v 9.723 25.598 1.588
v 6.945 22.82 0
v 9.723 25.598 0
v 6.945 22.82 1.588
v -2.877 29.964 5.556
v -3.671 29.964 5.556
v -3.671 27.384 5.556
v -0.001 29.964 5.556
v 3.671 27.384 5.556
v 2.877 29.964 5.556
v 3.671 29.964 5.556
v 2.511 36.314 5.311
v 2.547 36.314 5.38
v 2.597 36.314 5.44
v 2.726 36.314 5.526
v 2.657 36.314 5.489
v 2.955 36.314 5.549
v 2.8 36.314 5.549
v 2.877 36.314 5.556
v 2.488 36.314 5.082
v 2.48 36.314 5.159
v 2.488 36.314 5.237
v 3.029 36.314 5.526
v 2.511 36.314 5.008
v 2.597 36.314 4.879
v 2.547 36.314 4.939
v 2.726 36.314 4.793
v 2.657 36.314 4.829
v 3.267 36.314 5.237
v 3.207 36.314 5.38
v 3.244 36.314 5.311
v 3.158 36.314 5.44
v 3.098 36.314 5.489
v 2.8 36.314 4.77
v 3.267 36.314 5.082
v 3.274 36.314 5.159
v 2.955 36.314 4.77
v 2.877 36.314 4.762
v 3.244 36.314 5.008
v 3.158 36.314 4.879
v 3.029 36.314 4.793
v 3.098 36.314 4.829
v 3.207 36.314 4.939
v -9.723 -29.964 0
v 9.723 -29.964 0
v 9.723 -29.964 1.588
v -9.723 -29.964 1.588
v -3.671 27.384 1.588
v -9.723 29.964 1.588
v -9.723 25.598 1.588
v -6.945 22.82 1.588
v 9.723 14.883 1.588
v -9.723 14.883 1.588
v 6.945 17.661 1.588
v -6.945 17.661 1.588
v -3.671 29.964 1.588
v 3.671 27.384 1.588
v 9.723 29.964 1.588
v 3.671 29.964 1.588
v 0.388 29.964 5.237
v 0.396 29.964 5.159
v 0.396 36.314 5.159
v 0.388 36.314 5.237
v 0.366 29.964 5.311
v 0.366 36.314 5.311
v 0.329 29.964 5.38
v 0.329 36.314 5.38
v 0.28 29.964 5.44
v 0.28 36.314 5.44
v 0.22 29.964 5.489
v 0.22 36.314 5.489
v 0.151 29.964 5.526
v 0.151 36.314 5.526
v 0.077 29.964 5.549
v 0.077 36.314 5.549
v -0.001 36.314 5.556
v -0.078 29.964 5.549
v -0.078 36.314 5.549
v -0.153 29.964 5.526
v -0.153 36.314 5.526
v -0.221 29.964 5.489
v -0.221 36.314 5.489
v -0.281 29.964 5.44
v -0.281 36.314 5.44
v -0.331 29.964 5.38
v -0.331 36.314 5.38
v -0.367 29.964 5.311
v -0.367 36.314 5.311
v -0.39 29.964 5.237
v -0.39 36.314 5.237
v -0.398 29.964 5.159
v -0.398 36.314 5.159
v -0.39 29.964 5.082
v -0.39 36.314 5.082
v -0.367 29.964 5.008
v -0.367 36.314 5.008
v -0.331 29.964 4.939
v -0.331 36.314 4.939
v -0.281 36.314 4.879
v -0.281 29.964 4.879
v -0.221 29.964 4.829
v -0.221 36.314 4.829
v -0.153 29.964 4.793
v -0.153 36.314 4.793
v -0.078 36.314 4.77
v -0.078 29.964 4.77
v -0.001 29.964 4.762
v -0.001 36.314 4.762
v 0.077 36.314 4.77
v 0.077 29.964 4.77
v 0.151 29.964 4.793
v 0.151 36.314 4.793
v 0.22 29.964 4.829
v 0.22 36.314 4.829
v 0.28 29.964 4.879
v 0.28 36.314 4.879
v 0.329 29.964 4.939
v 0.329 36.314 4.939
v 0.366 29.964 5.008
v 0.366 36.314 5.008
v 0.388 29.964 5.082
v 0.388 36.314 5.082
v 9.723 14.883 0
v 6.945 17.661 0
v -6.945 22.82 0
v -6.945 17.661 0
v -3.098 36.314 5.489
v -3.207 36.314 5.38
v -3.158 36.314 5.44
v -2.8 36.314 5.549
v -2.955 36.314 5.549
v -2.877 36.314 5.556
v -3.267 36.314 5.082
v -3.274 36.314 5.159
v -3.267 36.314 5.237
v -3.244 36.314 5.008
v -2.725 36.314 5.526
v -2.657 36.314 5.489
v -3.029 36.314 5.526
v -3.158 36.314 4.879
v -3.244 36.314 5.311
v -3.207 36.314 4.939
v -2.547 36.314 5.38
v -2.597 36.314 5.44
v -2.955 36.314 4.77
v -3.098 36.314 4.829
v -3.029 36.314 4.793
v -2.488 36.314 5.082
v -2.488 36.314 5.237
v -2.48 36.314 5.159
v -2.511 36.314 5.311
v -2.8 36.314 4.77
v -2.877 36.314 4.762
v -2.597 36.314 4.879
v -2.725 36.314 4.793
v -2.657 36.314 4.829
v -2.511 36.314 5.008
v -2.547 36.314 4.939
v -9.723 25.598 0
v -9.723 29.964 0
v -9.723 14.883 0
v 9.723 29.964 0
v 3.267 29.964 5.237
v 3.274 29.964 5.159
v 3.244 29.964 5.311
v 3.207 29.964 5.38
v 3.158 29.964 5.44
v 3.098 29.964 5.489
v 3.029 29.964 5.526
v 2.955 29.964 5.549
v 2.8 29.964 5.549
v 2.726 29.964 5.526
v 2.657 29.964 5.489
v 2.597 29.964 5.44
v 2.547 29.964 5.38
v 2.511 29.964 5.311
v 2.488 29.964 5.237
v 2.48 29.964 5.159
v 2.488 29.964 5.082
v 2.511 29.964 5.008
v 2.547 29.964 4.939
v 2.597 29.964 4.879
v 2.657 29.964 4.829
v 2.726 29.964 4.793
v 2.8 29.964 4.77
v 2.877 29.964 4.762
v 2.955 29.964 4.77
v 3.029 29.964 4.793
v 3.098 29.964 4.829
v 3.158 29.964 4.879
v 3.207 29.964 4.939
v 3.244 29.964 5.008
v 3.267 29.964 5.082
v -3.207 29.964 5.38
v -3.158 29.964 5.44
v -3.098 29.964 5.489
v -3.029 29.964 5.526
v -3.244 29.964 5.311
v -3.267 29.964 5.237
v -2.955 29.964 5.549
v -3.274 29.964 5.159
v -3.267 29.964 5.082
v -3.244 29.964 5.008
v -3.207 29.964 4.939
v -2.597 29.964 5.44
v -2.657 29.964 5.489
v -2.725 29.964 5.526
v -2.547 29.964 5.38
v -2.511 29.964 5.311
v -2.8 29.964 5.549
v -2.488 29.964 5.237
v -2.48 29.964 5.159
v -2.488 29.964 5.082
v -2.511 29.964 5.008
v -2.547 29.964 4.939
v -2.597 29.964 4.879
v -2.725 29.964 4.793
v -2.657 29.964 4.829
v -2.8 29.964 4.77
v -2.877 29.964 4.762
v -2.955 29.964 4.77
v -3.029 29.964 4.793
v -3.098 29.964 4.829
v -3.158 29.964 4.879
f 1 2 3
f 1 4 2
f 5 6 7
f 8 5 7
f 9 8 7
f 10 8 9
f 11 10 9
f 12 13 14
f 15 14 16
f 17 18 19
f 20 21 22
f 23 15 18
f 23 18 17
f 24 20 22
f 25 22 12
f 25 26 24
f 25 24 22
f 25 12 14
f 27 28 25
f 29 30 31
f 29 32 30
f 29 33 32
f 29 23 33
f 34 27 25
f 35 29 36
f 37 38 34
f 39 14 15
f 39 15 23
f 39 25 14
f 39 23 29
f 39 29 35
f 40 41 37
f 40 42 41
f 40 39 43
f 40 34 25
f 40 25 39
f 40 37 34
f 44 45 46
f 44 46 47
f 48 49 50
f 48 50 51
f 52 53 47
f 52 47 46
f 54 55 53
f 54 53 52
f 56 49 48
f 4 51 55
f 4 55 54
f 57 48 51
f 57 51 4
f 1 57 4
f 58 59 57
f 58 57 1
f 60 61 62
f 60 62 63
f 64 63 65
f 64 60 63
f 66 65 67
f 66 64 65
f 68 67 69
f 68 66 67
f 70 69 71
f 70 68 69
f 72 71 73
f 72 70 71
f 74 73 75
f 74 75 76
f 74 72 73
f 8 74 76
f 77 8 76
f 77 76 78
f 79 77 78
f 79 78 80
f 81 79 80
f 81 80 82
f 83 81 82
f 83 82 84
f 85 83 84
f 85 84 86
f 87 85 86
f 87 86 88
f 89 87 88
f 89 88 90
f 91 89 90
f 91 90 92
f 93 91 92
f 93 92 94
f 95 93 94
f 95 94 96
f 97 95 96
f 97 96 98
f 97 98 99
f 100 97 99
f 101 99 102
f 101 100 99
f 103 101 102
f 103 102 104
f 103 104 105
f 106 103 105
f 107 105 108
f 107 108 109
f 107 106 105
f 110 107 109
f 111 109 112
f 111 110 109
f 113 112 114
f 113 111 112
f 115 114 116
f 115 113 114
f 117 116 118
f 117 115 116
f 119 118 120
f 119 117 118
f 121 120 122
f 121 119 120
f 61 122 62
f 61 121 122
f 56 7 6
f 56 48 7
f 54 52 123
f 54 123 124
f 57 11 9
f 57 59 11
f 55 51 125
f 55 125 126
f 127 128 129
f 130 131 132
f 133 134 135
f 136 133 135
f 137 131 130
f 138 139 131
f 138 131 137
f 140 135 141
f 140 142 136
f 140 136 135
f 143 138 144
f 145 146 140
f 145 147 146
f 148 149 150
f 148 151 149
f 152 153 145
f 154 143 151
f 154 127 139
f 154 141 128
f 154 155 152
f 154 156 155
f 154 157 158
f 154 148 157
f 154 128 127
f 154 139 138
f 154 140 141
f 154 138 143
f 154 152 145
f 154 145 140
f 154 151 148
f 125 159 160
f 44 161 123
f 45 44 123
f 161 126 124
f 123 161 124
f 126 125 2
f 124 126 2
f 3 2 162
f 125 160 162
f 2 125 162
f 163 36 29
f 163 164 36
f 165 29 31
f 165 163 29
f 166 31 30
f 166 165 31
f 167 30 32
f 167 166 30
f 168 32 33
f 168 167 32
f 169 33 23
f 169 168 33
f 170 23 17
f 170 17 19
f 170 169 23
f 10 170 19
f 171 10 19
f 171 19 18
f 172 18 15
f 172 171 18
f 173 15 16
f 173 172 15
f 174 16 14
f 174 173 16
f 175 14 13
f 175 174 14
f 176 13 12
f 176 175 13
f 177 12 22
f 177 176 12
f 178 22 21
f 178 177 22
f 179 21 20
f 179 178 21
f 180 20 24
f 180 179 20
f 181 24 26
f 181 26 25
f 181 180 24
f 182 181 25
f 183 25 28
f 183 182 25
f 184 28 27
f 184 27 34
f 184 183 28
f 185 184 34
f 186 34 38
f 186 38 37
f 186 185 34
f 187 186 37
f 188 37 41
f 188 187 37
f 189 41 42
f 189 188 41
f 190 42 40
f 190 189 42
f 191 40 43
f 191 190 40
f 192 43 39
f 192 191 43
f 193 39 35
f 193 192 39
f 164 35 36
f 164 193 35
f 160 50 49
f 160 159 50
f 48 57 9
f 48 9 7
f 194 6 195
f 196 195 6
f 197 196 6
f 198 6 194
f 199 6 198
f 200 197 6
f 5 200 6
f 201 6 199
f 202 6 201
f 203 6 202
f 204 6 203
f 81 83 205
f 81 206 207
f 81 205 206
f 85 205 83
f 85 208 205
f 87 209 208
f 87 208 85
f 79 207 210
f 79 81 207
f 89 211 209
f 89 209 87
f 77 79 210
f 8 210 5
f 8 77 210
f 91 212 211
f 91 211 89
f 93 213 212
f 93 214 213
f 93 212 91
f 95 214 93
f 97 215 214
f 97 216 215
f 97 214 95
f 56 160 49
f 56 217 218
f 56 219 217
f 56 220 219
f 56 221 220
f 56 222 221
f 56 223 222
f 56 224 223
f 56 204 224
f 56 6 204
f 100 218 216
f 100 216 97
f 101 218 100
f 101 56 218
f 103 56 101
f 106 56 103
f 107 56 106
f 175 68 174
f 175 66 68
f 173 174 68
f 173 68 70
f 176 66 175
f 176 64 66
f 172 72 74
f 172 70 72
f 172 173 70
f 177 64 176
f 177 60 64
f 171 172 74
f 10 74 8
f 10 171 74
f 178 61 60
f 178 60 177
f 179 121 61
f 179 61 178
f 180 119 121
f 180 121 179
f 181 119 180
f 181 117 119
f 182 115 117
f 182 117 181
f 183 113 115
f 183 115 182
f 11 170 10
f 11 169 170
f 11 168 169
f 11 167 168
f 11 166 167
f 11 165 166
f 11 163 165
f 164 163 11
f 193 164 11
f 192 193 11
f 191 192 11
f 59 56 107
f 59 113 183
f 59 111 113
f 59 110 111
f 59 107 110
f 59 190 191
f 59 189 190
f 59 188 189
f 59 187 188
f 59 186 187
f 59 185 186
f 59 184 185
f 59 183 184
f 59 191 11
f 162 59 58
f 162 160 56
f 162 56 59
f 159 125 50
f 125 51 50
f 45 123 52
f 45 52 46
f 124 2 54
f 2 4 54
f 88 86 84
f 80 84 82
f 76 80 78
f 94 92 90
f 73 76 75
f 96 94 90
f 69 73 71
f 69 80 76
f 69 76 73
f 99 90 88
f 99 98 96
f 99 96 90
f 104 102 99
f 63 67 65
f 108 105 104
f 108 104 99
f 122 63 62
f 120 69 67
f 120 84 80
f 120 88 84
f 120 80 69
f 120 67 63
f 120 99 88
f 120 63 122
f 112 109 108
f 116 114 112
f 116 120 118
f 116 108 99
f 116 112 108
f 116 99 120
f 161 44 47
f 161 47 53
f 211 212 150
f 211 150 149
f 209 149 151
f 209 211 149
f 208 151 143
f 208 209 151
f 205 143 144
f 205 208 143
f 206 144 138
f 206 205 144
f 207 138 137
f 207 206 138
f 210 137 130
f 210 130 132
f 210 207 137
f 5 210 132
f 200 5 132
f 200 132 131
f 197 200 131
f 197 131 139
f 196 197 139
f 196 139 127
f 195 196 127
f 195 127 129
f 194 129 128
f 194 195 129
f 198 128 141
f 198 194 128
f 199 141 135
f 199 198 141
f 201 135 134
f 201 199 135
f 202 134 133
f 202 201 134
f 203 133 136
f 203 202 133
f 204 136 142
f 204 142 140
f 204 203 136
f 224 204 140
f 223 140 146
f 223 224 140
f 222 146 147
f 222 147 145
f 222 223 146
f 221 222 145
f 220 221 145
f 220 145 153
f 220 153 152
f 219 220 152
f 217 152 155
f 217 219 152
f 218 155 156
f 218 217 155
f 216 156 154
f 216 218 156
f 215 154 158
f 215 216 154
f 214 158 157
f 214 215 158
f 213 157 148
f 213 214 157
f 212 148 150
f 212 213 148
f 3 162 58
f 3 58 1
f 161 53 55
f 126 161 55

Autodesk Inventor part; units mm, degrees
ref_plane "YZ Plane" through (0, 0, 0) normal (1, 0, 0) x (0, 1, 0)
ref_plane "XZ Plane" through (0, 0, 0) normal (0, 1, 0) x (-1, 0, 0)
ref_plane "XY Plane" through (0, 0, 0) normal (0, 0, 1) x (1, 0, 0)
sketch "Sketch1" plane through (0, 0, 0) normal (0, 0, 1) x (1, 0, 0)
  line L0 (-9.7234, 29.9641) -> (9.7234, 29.9641)
  line L1 (9.7234, 29.9641) -> (9.7234, -29.9641)
  line L2 (9.7234, -29.9641) -> (-9.7234, -29.9641)
  line L3 (-9.7234, -29.9641) -> (-9.7234, 29.9641)
  point P0 (0, 0)
  point P1 (9.7234, 0)
  point P2 (0, -29.9641)
  dimension "d0" = 19.4469
  dimension "d1" = 59.9281
extrude "Extrusion1" add sketch "Sketch1" along normal blind 1.5875
sketch "Sketch2" plane through (0, 0, 1.5875) normal (0, 0, 1) x (1, 0, 0)
  line L0 (-9.7234, -29.9641) -> (9.7234, -29.9641) projected
  line L1 (9.7234, -29.9641) -> (9.7234, 14.8828)
  line L2 (9.7234, -29.9641) -> (9.7234, 29.9641) projected
  line L3 (-9.7234, 29.9641) -> (-9.7234, -29.9641) projected
  line L4 (-9.7234, -29.9641) -> (-9.7234, 14.8828)
  line L5 (-9.7234, 14.8828) -> (-0.7937, 23.8125)
  line L6 (-9.7234, 14.8828) -> (2.905, 14.8828) construction
  line L7 (9.7234, 14.8828) -> (4.7625, 19.8437)
  line L8 (9.7234, 14.8828) -> (16.7393, 14.8828) construction
  line L9 (6.9453, 22.8203) -> (6.9453, 17.6609)
  line L10 (-6.9453, 22.8203) -> (-6.9453, 17.6609)
  line L11 (-6.9453, 22.8203) -> (-9.7234, 25.5984)
  line L12 (6.9453, 22.8203) -> (9.7234, 25.5984)
  line L13 (-9.7234, 25.5984) -> (-9.7234, 14.8828)
  line L14 (9.7234, 25.5984) -> (9.7234, 14.8828)
  point P0 (0, 0)
  dimension "d4" = 44.8469
  dimension "d5" = 44.8469
  dimension "d6" = 45
  dimension "d7" = 135
  dimension "d8" = 5.1594
  dimension "d9" = 5.1594
  dimension "d10" = 2.7781
  dimension "d11" = 2.7781
  dimension "d12" = 0
  dimension "d13" = 0
extrude "Extrusion2" cut sketch "Sketch2" against normal blind 1.5875
sketch "Sketch3" plane through (0, 0, 1.5875) normal (0, 0, 1) x (1, 0, 0)
  line L0 (9.7234, 29.9641) -> (-9.7234, 29.9641) projected
  line L1 (-3.6711, 29.9641) -> (3.6711, 29.9641)
  line L2 (3.6711, 29.9641) -> (3.6711, 27.3844)
  line L3 (3.6711, 27.3844) -> (-3.6711, 27.3844)
  line L4 (-3.6711, 27.3844) -> (-3.6711, 29.9641)
  point P0 (0, 0)
  point P1 (0, 27.3844)
  dimension "d16" = 7.3422
  dimension "d17" = 2.5797
extrude "Extrusion3" add sketch "Sketch3" along normal blind 3.9688
sketch "Sketch4" plane through (-9.7234, 29.9641, 0) normal (0, 1, 0) x (1, 0, 0)
  circle A0 centre (12.6008, -5.1594) radius 0.3969
  circle A1 centre (9.7226, -5.1594) radius 0.3969
  circle A2 centre (6.8461, -5.1594) radius 0.3969
  line L0 (13.3945, -1.5875) -> (13.3945, -5.5563) projected
  line L1 (13.3945, -5.5563) -> (6.0523, -5.5563) projected
  line L2 (6.0523, -1.5875) -> (6.0523, -5.5563) projected
  point P0 (9.7234, 0)
  dimension "d20" = 0.7937
  dimension "d21" = 0.7937
  dimension "d22" = 0.7937
  dimension "d23" = 0.7937
  dimension "d24" = 0.3969
  dimension "d25" = 0.7937
  dimension "d26" = 0.3969
  dimension "d27" = 0.3969
  dimension "d28" = 7.3422
  dimension "d29" = 3.6703
extrude "Extrusion4" add sketch "Sketch4" along normal blind 6.35
properties part number "Water Sensor"
